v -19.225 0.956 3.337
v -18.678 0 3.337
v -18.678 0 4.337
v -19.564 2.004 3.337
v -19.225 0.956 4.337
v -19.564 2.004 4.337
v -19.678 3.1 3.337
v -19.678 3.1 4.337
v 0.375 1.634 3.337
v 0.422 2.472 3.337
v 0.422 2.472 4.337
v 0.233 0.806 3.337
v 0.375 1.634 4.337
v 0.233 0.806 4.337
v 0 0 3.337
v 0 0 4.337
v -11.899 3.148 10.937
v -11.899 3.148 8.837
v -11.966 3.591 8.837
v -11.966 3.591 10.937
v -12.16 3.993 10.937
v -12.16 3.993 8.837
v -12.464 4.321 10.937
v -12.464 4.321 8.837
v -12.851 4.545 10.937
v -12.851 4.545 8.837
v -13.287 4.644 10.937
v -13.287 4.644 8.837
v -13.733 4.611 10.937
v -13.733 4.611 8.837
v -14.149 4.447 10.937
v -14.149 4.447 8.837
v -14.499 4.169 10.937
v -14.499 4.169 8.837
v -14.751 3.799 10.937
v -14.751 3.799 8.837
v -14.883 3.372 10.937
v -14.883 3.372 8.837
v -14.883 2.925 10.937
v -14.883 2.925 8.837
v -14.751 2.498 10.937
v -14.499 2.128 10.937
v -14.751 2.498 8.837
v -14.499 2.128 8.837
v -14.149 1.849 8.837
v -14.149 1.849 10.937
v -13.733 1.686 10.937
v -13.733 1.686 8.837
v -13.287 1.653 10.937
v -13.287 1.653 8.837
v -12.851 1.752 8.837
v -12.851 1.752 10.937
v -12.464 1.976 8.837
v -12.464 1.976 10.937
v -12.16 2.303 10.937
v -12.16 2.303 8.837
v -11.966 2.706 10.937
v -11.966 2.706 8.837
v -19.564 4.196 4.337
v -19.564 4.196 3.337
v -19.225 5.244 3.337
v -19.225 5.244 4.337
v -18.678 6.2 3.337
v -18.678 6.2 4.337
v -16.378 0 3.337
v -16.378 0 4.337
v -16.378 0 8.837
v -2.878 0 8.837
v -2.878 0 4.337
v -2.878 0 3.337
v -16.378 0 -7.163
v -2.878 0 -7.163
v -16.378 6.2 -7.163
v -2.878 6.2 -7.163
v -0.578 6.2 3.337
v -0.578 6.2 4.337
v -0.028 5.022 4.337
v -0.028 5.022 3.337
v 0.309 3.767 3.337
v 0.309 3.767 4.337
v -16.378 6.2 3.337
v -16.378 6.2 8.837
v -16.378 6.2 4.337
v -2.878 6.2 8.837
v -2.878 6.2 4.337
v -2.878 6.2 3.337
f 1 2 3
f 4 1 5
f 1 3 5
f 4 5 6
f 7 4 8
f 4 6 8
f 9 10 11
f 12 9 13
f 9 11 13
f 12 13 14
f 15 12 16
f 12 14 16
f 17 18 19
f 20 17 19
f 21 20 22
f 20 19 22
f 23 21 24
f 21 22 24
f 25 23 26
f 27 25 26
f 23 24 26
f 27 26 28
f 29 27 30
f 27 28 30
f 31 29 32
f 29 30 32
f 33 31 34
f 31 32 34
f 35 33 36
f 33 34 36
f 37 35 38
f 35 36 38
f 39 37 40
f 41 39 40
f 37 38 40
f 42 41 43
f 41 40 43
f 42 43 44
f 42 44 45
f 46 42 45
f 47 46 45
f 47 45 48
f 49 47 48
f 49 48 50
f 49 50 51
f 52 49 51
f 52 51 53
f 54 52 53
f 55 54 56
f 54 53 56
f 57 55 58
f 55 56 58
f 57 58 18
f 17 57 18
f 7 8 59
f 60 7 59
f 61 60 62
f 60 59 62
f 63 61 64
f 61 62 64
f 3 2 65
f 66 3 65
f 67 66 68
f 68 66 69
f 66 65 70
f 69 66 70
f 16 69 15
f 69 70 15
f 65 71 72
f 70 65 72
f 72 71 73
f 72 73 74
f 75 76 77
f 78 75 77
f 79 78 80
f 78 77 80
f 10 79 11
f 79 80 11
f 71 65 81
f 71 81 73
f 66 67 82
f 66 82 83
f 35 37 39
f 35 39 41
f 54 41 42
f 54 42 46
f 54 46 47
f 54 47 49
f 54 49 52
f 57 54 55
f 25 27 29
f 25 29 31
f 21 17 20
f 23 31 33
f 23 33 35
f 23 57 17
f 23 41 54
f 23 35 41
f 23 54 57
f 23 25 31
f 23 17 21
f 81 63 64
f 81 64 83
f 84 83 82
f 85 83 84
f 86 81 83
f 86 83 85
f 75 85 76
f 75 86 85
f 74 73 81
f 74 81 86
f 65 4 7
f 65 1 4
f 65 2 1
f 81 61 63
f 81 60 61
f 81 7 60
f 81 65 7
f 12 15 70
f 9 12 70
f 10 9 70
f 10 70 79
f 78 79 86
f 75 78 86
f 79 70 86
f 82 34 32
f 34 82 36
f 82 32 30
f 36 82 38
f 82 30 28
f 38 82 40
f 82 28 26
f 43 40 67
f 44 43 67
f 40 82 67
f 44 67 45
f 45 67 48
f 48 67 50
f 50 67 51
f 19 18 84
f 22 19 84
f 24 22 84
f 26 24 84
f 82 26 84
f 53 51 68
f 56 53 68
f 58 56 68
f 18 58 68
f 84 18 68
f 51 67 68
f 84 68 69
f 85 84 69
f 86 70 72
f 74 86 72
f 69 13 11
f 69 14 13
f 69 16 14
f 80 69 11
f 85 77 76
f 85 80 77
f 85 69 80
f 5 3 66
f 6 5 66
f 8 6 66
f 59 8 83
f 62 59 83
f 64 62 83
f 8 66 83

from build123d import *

# Parameters (mm, degrees)
SKETCH_1_W          = 13.5
SKETCH_1_H          = 16
EXTRUDE_1_DEPTH     = 6.2
SKETCH_2_R          = 1.5
EXTRUDE_2_DEPTH     = 2.1
SKETCH_3_W          = 1
SKETCH_3_H          = 6.2
EXTRUDE_3_DEPTH     = 3.3
CUT_EXTRUDE_1_DEPTH = 4
SKETCH_6_W          = 1
SKETCH_6_H          = 6.2
EXTRUDE_4_DEPTH     = 3.3
CUT_EXTRUDE_2_DEPTH = 4


with BuildPart() as part:
    # 草图1 → 凸台-拉伸1 (new body)
    with BuildSketch(Plane(origin=(0, 0, 0), x_dir=(1, 0, 0), z_dir=(0, 1, 0))):
        with Locations((-9.627906977, -0.837209302)):
            Rectangle(SKETCH_1_W, SKETCH_1_H)
    extrude(amount=EXTRUDE_1_DEPTH)

    # 草图2 → 凸台-拉伸2 (add)
    with BuildSketch(Plane.XY.offset(8.837209302)):
        with Locations((-13.399361956, 3.148420963)):
            Circle(SKETCH_2_R)
    extrude(amount=EXTRUDE_2_DEPTH)

    # 草图3 → 凸台-拉伸3 (add)
    with BuildSketch(Plane.ZY.offset(16.377906977)):
        with Locations((3.837209302, 3.1)):
            Rectangle(SKETCH_3_W, SKETCH_3_H)
    extrude(amount=EXTRUDE_3_DEPTH)

    # 草图5 → 切除-拉伸1 (cut)
    with BuildSketch(Plane.XY.offset(4.337209302)):
        with BuildLine():
            ThreePointArc((-19.677906977, 3.1), (-19.421721194, 4.728649747), (-18.677906977, 6.2))
            Line((-18.677906977, 6.2), (-19.677906977, 6.2))
            Line((-19.677906977, 6.2), (-19.677906977, 3.1))
        make_face()
        with BuildLine():
            ThreePointArc((-18.677906977, 0), (-19.421721194, 1.471350253), (-19.677906977, 3.1))
            Line((-19.677906977, 3.1), (-19.677906977, 0))
            Line((-19.677906977, 0), (-18.677906977, 0))
        make_face()
    extrude(amount=-CUT_EXTRUDE_1_DEPTH, mode=Mode.SUBTRACT)

    # 草图6 → 凸台-拉伸4 (add)
    with BuildSketch(Plane(origin=(-2.877906977, 0, 0), x_dir=(0, 0, -1), z_dir=(1, 0, 0))):
        with Locations((-3.837209302, 3.1)):
            Rectangle(SKETCH_6_W, SKETCH_6_H)
    extrude(amount=EXTRUDE_4_DEPTH)

    # 草图10 → 切除-拉伸2 (cut)
    with BuildSketch(Plane.XY.offset(4.337209302)):
        with BuildLine():
            Line((0.422093023, 0), (0.422093023, 2.47192447))
            ThreePointArc((0.422093023, 2.47192447), (0.315811593, 1.218073092), (0, 0))
            Line((0, 0), (0.422093023, 0))
        make_face()
        with BuildLine():
            Line((0.422093023, 6.2), (-0.577906977, 6.2))
            ThreePointArc((-0.577906977, 6.2), (0.167750994, 4.401856278), (0.422093023, 2.47192447))
            Line((0.422093023, 2.47192447), (0.422093023, 6.2))
        make_face()
    extrude(amount=-CUT_EXTRUDE_2_DEPTH, mode=Mode.SUBTRACT)


solid = part.part
